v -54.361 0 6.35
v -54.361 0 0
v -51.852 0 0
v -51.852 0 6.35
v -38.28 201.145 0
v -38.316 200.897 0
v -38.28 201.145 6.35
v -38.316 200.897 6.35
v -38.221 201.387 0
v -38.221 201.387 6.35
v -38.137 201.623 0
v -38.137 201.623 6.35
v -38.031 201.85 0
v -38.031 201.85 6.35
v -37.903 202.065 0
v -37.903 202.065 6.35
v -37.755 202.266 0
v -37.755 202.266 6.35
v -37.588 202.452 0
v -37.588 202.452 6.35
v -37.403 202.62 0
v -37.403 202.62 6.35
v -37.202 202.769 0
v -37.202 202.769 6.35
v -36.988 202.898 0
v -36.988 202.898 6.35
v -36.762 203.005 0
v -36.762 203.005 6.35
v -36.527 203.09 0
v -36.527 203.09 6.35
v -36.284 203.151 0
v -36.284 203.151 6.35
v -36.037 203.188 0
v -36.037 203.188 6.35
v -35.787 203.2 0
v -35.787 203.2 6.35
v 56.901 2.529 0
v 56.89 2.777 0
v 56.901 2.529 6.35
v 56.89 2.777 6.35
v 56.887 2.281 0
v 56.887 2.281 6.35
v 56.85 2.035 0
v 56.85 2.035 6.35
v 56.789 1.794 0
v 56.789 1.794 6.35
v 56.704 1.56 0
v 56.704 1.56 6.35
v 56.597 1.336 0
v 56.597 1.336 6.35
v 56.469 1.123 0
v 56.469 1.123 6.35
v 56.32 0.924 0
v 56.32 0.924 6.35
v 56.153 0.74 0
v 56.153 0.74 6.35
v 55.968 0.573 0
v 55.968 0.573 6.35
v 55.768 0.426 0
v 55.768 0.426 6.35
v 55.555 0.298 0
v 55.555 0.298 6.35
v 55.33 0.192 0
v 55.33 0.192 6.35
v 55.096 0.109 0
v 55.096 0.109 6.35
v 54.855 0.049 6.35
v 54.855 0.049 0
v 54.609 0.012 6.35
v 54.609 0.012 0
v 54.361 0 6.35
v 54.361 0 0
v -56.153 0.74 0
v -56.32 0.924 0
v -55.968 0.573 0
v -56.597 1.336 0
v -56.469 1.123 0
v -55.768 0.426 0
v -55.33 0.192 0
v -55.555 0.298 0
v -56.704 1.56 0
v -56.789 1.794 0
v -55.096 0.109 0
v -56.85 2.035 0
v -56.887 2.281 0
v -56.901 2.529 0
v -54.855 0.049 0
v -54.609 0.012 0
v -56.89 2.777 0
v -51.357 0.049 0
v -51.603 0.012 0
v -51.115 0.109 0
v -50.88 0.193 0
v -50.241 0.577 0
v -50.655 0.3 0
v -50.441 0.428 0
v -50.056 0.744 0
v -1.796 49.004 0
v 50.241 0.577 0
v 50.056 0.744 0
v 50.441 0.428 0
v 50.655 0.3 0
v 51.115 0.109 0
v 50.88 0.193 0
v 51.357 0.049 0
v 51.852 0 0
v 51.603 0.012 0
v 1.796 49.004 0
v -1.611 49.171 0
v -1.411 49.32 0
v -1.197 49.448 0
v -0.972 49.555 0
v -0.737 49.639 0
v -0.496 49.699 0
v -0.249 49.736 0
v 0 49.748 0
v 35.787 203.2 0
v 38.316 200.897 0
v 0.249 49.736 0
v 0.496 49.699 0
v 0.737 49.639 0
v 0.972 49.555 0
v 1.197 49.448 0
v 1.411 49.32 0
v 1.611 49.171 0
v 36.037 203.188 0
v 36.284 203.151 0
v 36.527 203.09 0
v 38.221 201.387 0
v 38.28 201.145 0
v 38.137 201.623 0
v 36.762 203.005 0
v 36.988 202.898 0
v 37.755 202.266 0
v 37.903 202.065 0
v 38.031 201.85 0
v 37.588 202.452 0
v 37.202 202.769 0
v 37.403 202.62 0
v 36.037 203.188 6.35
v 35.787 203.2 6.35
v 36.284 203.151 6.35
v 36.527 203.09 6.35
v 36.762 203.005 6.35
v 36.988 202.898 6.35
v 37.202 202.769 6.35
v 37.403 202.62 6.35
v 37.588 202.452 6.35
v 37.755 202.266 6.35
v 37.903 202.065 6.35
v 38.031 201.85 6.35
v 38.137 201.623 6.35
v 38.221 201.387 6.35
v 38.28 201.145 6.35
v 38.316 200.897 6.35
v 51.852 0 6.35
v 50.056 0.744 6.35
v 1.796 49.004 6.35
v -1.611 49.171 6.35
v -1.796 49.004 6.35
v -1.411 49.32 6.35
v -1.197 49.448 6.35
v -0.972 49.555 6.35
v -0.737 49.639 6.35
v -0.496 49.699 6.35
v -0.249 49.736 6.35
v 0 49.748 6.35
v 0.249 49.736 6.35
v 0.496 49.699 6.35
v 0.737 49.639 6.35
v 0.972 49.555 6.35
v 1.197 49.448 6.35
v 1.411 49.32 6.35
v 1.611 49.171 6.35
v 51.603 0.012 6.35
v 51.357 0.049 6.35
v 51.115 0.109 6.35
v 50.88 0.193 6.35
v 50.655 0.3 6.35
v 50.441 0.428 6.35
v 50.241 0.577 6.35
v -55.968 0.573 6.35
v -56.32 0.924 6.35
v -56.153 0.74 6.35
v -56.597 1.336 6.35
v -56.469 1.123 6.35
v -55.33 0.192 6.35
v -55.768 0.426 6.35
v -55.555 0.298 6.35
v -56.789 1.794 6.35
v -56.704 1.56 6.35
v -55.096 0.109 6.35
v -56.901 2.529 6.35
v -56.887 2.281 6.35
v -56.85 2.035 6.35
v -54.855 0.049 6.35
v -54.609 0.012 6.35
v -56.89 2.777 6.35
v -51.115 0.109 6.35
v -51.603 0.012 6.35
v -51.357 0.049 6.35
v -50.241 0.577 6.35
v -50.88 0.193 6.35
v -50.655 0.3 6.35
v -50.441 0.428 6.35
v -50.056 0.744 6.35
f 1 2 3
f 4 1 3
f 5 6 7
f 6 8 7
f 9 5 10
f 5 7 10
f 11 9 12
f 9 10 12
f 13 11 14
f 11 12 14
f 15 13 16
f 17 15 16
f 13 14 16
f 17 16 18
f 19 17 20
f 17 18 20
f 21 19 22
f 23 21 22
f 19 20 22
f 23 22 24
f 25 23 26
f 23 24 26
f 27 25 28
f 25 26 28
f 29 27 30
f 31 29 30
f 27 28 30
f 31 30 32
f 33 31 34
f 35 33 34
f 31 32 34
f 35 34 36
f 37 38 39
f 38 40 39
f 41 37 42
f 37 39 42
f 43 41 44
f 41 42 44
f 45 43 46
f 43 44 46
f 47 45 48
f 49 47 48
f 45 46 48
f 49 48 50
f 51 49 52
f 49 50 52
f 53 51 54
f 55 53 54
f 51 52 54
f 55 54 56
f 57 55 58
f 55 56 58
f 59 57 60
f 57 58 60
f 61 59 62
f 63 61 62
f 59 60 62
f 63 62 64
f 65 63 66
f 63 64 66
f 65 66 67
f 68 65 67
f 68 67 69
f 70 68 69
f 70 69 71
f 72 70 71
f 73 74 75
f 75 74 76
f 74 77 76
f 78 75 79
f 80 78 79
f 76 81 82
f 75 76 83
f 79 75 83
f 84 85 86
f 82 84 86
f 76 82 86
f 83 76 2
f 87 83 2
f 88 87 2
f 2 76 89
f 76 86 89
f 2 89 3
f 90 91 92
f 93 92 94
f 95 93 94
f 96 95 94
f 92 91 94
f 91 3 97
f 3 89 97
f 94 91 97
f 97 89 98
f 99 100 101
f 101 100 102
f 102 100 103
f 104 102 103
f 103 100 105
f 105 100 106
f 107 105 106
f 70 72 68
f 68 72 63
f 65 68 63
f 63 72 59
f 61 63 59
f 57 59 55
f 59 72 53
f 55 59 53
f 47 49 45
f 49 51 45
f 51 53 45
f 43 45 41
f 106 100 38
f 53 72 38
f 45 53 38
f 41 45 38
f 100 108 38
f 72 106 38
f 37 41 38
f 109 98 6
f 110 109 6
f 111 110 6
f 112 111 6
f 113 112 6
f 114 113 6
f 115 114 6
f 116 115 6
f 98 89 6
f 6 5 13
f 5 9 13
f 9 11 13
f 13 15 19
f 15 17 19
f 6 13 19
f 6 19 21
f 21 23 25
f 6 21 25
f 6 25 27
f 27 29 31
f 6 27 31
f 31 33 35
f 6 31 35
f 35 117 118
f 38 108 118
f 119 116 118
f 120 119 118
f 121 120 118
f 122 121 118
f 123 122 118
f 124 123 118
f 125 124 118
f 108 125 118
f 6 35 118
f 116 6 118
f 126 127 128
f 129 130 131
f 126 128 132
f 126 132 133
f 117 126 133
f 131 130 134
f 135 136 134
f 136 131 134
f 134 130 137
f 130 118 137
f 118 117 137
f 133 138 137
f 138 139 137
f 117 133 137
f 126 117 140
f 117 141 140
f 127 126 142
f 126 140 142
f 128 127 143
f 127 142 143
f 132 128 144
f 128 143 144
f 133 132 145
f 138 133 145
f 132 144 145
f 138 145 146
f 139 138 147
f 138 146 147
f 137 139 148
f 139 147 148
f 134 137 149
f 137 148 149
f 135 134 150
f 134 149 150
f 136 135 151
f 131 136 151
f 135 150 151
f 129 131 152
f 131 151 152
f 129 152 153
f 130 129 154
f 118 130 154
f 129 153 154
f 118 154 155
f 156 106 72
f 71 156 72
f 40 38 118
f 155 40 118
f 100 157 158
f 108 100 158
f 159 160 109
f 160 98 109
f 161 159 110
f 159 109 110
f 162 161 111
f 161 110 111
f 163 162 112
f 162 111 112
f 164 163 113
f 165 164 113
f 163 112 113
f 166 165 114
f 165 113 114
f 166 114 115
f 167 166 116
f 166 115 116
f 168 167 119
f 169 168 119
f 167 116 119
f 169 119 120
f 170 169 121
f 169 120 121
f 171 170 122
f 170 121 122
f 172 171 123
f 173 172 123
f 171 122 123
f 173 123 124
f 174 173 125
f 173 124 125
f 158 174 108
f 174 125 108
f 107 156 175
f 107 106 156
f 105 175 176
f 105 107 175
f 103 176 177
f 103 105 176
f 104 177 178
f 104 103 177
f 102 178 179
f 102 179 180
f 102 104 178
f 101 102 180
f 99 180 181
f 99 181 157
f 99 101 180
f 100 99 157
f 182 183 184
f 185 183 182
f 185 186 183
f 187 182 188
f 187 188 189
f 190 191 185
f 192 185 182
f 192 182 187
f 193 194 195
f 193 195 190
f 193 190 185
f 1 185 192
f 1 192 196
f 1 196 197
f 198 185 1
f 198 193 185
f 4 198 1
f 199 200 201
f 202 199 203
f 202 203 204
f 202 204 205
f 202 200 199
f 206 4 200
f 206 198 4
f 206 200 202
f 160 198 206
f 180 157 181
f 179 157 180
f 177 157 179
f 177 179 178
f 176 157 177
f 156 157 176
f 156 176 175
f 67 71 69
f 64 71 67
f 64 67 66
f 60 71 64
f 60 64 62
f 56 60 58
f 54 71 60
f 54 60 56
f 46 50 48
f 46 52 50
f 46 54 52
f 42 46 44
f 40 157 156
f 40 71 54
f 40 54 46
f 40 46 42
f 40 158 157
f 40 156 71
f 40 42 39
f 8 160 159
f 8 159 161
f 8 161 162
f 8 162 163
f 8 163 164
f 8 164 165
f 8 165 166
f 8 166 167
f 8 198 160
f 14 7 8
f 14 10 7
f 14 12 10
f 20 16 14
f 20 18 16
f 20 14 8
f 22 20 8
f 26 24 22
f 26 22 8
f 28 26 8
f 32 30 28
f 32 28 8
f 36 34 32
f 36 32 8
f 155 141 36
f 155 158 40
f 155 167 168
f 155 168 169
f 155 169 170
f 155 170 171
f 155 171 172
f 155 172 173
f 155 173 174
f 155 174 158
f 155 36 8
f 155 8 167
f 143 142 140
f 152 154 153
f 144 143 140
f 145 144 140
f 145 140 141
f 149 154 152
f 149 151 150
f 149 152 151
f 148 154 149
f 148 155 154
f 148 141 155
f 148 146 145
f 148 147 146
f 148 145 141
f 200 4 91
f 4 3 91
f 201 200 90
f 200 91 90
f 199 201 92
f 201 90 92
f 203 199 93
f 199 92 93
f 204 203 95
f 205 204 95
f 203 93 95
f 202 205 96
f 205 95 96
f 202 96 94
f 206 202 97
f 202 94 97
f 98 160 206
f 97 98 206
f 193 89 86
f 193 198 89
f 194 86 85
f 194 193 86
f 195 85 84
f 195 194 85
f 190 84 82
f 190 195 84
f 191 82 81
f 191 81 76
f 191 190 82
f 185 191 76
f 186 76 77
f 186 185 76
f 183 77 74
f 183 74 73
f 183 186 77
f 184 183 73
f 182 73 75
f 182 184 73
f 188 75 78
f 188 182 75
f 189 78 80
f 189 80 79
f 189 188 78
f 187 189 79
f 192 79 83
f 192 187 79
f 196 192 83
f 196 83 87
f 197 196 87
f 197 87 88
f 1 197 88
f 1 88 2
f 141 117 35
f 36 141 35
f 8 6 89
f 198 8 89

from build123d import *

# Parameters (mm, degrees)
F1_DEPTH = 6.35
F3_DEPTH = 6.351
F4_R     = 2.54


with BuildPart() as f1:
    # F0 (on Top) → F1 (new body)
    with BuildSketch(Plane.XY):
        Polygon((-38.1, 203.2), (-57.15, 0), (57.15, 0), (38.1, 203.2), align=None)
    extrude(amount=F1_DEPTH)

    # F2 (on face) → F3 (cut, through all)
    with BuildSketch(Plane.XY.offset(6.35)):
        Polygon((0, 50.8), (-50.8, 0), (50.8, 0), align=None)
    extrude(amount=-F3_DEPTH, mode=Mode.SUBTRACT)

    # F4
    f4_edges = [f1.edges().sort_by_distance(p)[0] for p in [
        (-38.1, 203.2, 3.175),
        (38.1, 203.2, 3.175),
        (0, 50.8, 3.175),
        (-50.8, 0, 3.175),
        (-57.15, 0, 3.175),
        (50.8, 0, 3.175),
        (57.15, 0, 3.175),
    ]]
    fillet(f4_edges, radius=F4_R)


solid = f1.part
